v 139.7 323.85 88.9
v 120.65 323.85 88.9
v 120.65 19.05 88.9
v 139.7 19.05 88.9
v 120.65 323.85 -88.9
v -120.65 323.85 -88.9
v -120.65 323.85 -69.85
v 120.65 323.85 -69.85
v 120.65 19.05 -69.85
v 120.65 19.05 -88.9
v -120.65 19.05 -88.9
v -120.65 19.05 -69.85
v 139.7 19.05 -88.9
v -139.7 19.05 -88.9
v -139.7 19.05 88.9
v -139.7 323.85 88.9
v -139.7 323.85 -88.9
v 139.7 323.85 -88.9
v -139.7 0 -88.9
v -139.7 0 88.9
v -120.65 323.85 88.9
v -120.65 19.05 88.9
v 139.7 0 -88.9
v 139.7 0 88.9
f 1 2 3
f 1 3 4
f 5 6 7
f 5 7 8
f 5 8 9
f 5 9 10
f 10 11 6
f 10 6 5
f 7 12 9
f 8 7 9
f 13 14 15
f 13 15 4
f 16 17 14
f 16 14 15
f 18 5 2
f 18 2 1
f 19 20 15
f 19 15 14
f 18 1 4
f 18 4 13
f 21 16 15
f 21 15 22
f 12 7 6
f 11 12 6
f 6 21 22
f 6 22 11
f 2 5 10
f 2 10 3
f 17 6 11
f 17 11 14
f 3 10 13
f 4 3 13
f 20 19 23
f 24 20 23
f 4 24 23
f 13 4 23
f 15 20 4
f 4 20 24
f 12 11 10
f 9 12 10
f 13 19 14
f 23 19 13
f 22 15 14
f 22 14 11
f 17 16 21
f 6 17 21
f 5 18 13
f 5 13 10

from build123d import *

# Parameters (mm, degrees)
SKETCH1_W             = 279.4
SKETCH1_H             = 177.8
BOSS_EXTRUDE1_DEPTH   = 19.05
BOSS_EXTRUDE2_DEPTH   = 304.8
BOSS_EXTRUDE2_2_DEPTH = 304.8
SKETCH2_3_W           = 241.3
SKETCH2_3_H           = 19.05
BOSS_EXTRUDE3_DEPTH   = 304.8


with BuildPart() as part:
    # Sketch1 → Boss-Extrude1 (new body)
    with BuildSketch(Plane(origin=(0, 0, 0), x_dir=(1, 0, 0), z_dir=(0, 1, 0))):
        Rectangle(SKETCH1_W, SKETCH1_H)
    extrude(amount=BOSS_EXTRUDE1_DEPTH)


with BuildPart() as body_2:
    # Sketch2 → Boss-Extrude2 (new body)
    with BuildSketch(Plane(origin=(0, 19.05, 0), x_dir=(1, 0, 0), z_dir=(0, 1, 0))):
        Polygon((-120.65, 88.9), (-139.7, 88.9), (-139.7, -88.9), (-120.65, -88.9), (-120.65, 69.85), align=None)
    extrude(amount=BOSS_EXTRUDE2_DEPTH)


with BuildPart() as body_3:
    # Sketch2 → Boss-Extrude2 2 (new body)
    with BuildSketch(Plane(origin=(0, 19.05, 0), x_dir=(1, 0, 0), z_dir=(0, 1, 0))):
        Polygon((139.7, 88.9), (120.65, 88.9), (120.65, 69.85), (120.65, -88.9), (139.7, -88.9), align=None)
    extrude(amount=BOSS_EXTRUDE2_2_DEPTH)


with BuildPart() as body_4:
    # Sketch2<3> → Boss-Extrude3 (new body)
    with BuildSketch(Plane(origin=(0, 19.05, 0), x_dir=(1, 0, 0), z_dir=(0, 1, 0))):
        with Locations((0, 79.375)):
            Rectangle(SKETCH2_3_W, SKETCH2_3_H)
    extrude(amount=BOSS_EXTRUDE3_DEPTH)


solid = Compound([part.part, body_2.part, body_3.part, body_4.part])
